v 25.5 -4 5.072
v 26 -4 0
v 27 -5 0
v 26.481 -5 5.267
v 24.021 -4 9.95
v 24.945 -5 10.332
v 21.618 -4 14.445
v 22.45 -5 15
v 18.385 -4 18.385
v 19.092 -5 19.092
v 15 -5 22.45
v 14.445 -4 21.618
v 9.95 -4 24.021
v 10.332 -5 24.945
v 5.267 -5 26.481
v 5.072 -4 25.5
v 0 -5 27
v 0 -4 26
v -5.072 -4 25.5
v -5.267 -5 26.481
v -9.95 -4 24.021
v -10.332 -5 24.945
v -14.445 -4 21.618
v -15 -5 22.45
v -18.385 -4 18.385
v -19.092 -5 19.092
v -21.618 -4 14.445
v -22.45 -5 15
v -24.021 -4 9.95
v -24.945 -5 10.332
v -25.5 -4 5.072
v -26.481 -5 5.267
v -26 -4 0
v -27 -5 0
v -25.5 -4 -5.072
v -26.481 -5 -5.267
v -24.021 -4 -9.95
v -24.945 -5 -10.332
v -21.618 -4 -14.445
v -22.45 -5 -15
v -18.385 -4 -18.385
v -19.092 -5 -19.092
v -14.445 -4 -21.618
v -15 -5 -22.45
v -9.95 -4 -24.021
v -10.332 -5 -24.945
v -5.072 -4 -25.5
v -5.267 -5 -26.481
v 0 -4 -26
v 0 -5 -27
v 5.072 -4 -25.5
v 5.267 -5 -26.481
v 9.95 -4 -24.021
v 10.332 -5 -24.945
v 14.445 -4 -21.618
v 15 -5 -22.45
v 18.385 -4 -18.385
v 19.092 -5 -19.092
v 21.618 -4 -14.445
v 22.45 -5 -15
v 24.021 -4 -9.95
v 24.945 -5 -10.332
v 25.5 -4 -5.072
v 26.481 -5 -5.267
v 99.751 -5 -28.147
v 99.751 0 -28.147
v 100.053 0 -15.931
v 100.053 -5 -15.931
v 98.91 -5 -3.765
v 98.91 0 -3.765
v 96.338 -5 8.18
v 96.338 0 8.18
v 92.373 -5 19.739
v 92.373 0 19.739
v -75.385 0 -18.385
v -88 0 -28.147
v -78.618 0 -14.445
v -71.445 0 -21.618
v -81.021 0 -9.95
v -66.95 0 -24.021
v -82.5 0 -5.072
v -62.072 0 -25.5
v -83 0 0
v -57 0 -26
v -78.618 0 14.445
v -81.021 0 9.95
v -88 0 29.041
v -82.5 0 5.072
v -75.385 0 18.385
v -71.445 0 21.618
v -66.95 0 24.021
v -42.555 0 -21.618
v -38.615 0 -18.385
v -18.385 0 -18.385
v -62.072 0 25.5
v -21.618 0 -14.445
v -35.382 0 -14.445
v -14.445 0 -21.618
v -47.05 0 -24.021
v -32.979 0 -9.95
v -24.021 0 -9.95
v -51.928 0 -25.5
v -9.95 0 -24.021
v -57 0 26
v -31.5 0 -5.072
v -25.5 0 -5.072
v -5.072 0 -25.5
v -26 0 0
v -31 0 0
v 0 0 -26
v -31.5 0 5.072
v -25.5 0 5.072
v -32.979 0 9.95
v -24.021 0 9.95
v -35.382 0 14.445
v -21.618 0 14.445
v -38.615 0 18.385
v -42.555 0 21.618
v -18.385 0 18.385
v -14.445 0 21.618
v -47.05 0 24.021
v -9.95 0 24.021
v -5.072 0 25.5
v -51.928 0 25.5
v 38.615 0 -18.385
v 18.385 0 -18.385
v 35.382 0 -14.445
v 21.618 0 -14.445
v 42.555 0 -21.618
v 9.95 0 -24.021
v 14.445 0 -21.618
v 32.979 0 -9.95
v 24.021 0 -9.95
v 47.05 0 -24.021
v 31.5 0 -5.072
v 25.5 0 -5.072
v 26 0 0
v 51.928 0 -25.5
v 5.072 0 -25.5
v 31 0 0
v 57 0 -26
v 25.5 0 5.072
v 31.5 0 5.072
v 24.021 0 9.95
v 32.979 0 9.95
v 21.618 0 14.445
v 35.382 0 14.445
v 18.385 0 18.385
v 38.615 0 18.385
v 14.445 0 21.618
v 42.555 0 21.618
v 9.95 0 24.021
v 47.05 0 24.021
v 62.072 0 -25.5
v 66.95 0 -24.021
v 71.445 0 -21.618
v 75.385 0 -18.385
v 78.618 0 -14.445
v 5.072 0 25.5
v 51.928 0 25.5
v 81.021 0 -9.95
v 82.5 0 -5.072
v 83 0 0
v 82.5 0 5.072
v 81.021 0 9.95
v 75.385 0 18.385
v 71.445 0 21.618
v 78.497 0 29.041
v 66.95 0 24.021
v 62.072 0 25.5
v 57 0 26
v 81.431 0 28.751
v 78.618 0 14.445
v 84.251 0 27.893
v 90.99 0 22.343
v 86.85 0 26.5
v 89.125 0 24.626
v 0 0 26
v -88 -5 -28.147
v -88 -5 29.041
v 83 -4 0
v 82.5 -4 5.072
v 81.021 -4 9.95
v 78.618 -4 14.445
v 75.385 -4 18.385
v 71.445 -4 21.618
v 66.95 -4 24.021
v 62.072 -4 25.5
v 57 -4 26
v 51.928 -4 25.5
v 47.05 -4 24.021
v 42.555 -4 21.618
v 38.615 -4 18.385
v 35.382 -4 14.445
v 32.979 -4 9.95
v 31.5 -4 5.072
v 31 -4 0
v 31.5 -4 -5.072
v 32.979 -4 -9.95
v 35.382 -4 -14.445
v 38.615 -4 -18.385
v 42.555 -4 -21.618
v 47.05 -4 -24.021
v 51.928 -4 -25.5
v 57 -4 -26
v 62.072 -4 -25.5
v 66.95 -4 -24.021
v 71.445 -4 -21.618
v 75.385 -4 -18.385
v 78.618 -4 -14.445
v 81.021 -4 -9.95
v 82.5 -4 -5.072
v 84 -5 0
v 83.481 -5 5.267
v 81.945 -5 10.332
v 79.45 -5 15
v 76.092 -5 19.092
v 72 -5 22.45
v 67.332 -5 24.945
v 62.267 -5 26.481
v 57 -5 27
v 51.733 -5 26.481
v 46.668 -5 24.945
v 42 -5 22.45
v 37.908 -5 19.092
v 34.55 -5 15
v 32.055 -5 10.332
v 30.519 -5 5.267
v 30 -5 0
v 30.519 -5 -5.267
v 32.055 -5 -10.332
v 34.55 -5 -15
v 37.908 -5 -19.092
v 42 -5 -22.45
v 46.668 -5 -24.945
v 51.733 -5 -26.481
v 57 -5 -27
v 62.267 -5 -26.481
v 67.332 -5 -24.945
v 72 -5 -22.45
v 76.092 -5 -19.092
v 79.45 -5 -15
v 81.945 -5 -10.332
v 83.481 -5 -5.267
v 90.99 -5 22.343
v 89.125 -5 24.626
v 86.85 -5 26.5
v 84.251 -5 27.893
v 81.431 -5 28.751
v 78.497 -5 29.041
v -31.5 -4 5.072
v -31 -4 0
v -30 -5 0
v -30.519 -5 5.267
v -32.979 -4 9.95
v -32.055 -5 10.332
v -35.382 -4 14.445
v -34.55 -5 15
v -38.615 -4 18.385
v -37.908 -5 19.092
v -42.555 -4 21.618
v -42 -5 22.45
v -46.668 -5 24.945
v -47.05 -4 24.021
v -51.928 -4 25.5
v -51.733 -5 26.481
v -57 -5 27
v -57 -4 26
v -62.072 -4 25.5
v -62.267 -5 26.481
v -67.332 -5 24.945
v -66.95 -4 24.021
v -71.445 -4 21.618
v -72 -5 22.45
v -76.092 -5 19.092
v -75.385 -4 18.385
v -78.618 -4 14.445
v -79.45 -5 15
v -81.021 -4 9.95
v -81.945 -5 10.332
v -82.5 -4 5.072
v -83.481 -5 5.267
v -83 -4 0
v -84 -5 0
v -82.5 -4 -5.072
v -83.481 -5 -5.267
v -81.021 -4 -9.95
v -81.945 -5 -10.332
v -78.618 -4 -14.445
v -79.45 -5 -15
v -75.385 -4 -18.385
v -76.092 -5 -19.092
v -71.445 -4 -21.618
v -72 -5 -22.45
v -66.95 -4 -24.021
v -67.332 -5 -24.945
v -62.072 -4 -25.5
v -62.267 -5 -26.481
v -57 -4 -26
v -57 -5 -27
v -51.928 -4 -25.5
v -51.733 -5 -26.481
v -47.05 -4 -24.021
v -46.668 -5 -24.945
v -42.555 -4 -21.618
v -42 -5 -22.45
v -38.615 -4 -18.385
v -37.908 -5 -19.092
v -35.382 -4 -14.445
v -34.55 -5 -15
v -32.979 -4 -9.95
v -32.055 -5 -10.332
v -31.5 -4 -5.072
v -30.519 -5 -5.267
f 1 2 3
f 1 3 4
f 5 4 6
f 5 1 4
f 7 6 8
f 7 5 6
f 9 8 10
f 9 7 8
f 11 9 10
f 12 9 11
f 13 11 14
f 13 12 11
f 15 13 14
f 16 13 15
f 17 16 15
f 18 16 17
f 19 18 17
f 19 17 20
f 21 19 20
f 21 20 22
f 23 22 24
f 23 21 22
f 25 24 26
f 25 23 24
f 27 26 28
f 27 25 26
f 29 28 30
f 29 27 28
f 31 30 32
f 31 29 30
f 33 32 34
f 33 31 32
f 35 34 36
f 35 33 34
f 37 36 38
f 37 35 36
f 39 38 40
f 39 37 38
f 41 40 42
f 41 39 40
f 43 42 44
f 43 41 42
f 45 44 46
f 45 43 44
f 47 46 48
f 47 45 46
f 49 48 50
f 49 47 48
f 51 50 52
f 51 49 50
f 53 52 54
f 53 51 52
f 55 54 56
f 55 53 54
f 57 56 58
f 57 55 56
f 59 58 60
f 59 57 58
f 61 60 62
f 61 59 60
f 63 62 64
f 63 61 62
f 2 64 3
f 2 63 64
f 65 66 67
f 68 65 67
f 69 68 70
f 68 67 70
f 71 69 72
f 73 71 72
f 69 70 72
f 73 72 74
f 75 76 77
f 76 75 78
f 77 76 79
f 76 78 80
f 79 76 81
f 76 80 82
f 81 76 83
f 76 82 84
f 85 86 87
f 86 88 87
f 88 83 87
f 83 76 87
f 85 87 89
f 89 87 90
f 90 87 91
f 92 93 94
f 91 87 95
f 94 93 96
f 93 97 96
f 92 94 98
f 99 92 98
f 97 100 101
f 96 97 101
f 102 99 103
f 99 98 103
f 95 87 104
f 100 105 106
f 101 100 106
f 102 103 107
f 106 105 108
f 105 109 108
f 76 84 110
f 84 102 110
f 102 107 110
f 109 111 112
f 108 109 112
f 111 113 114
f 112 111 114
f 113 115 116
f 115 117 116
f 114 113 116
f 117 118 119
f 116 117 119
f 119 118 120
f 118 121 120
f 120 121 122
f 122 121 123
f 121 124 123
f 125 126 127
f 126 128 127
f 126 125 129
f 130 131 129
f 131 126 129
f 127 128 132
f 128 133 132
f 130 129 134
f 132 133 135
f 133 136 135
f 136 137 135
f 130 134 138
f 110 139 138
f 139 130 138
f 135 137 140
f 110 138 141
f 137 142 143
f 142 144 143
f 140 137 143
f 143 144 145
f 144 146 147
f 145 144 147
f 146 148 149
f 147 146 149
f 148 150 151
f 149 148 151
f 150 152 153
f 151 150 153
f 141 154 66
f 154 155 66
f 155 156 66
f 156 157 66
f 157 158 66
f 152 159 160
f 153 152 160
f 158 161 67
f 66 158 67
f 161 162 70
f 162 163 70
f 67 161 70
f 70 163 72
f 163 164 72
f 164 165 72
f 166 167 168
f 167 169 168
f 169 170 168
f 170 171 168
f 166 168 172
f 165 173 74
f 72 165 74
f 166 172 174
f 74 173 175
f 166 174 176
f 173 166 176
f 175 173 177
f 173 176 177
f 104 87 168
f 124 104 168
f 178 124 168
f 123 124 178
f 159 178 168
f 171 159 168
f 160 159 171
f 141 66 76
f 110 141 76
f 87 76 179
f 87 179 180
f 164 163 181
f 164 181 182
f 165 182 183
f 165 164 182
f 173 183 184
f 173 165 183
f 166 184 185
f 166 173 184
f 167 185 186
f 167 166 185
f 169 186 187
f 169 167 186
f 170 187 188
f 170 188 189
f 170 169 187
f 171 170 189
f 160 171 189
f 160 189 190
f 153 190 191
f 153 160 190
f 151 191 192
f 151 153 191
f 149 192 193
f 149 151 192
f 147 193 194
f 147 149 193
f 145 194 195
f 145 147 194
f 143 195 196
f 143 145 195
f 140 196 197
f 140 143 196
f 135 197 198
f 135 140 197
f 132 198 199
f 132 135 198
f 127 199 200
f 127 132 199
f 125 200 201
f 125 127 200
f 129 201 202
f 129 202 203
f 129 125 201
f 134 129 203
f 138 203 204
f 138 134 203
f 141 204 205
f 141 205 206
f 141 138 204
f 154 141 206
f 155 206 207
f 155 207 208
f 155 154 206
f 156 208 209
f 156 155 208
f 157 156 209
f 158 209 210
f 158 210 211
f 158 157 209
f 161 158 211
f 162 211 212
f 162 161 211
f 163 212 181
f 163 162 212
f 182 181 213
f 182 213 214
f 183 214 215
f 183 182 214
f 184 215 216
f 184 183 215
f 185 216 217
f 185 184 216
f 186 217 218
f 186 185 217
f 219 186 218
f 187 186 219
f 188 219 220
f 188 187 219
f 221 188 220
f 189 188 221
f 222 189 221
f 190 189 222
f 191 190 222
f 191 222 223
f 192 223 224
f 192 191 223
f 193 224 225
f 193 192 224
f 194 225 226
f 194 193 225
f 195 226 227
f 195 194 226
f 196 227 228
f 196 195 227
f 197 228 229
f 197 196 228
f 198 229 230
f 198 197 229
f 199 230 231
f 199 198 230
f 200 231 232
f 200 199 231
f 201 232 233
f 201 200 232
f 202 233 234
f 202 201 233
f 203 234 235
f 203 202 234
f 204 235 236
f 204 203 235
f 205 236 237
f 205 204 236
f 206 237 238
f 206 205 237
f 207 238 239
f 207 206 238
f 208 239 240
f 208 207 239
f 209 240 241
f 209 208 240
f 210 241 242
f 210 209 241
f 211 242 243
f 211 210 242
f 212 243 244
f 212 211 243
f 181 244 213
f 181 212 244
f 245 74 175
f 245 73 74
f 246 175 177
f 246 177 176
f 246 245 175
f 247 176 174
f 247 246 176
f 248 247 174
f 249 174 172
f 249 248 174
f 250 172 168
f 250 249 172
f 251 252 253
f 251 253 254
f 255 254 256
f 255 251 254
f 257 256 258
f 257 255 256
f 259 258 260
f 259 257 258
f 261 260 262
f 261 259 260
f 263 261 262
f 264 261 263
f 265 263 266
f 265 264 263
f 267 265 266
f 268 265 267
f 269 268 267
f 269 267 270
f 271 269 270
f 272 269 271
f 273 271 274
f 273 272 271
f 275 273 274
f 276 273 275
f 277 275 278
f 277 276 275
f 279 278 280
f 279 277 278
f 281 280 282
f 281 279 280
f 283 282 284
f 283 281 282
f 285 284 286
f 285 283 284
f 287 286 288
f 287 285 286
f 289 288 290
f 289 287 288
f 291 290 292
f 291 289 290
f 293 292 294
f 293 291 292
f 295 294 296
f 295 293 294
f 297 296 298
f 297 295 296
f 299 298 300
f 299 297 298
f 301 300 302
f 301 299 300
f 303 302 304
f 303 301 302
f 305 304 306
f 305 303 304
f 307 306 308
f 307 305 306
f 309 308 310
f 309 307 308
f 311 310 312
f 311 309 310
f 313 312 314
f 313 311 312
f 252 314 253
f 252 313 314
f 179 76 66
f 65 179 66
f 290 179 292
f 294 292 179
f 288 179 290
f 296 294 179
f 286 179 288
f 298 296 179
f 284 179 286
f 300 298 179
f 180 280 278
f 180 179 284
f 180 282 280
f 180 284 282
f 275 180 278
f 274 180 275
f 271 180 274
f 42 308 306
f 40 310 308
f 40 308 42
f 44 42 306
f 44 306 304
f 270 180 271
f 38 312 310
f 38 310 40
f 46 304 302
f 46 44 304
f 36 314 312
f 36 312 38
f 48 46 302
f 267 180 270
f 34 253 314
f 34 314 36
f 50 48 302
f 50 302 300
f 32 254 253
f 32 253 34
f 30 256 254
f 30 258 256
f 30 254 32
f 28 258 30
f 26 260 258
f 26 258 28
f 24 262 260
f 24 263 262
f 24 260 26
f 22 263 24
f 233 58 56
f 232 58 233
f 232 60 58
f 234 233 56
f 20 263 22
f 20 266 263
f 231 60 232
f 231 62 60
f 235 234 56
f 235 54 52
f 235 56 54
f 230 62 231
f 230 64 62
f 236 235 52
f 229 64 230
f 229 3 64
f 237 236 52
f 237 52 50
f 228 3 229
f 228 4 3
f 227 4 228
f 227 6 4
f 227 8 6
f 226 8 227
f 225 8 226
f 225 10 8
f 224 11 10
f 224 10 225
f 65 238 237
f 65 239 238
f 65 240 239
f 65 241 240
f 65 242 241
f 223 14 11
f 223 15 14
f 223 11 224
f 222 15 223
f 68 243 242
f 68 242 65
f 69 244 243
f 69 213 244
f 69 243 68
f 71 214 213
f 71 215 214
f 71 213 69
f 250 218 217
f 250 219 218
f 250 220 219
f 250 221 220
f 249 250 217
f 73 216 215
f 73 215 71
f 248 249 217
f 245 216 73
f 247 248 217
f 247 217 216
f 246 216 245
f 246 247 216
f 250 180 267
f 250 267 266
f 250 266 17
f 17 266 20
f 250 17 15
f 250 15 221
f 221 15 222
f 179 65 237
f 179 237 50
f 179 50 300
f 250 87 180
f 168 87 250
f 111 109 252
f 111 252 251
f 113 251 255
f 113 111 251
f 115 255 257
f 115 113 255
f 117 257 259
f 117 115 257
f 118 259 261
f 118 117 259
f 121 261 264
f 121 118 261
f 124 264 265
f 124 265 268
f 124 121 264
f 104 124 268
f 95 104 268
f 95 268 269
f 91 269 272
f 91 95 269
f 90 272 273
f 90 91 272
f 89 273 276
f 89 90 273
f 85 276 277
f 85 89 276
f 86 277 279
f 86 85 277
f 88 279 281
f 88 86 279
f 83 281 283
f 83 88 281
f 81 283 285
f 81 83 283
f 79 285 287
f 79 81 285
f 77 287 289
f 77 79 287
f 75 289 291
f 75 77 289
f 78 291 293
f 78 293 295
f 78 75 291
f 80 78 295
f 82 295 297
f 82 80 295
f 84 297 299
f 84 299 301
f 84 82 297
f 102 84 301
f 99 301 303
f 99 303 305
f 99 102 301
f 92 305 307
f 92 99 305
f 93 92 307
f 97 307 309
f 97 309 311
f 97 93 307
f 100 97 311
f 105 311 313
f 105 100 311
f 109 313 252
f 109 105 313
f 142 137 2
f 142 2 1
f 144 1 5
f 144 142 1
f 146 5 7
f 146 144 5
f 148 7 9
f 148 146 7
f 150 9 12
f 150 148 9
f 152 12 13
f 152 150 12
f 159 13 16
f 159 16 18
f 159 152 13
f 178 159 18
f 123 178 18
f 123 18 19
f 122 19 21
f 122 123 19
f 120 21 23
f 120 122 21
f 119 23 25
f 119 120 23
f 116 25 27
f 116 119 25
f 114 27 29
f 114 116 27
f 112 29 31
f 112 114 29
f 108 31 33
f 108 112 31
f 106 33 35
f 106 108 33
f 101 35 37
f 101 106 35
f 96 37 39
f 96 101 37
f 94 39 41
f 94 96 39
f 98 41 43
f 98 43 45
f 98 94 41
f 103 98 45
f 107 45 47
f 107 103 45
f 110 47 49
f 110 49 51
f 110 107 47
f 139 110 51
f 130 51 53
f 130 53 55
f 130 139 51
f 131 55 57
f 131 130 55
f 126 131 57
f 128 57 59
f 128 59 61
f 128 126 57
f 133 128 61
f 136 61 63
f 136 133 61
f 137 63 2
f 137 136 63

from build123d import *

# Parameters (mm, degrees)
F0_W     = 176
F0_H     = 57.188374
F0_R     = 26
F1_DEPTH = 5
F2_R     = 15
F3_SIZE  = 1


with BuildPart() as f1:
    # F0 (on Front) → F1 (new body)
    with BuildSketch(Plane.XZ):
        with Locations((0, 0.446782)):
            Rectangle(F0_W, F0_H)
        with Locations((-57, 0)):
            Circle(F0_R, mode=Mode.SUBTRACT)
        Circle(F0_R, mode=Mode.SUBTRACT)
        with Locations((57, 0)):
            Circle(F0_R, mode=Mode.SUBTRACT)
        with BuildLine():
            ThreePointArc((99.751152, -28.147405), (98.000731, 1.294425), (88, 29.040969))
            Line((88, 29.040969), (88, -28.147405))
            Line((88, -28.147405), (99.751152, -28.147405))
        make_face()
    extrude(amount=F1_DEPTH)

    # F2
    f2_edges = [f1.edges().sort_by_distance(p)[0] for p in [
        (88, -2.5, 29.040969),
    ]]
    fillet(f2_edges, radius=F2_R)

    # F3
    f3_edges = [f1.edges().sort_by_distance(p)[0] for p in [
        (-83, -5, 0),
        (-26, -5, 0),
        (31, -5, 0),
    ]]
    chamfer(f3_edges, length=F3_SIZE)


solid = f1.part
